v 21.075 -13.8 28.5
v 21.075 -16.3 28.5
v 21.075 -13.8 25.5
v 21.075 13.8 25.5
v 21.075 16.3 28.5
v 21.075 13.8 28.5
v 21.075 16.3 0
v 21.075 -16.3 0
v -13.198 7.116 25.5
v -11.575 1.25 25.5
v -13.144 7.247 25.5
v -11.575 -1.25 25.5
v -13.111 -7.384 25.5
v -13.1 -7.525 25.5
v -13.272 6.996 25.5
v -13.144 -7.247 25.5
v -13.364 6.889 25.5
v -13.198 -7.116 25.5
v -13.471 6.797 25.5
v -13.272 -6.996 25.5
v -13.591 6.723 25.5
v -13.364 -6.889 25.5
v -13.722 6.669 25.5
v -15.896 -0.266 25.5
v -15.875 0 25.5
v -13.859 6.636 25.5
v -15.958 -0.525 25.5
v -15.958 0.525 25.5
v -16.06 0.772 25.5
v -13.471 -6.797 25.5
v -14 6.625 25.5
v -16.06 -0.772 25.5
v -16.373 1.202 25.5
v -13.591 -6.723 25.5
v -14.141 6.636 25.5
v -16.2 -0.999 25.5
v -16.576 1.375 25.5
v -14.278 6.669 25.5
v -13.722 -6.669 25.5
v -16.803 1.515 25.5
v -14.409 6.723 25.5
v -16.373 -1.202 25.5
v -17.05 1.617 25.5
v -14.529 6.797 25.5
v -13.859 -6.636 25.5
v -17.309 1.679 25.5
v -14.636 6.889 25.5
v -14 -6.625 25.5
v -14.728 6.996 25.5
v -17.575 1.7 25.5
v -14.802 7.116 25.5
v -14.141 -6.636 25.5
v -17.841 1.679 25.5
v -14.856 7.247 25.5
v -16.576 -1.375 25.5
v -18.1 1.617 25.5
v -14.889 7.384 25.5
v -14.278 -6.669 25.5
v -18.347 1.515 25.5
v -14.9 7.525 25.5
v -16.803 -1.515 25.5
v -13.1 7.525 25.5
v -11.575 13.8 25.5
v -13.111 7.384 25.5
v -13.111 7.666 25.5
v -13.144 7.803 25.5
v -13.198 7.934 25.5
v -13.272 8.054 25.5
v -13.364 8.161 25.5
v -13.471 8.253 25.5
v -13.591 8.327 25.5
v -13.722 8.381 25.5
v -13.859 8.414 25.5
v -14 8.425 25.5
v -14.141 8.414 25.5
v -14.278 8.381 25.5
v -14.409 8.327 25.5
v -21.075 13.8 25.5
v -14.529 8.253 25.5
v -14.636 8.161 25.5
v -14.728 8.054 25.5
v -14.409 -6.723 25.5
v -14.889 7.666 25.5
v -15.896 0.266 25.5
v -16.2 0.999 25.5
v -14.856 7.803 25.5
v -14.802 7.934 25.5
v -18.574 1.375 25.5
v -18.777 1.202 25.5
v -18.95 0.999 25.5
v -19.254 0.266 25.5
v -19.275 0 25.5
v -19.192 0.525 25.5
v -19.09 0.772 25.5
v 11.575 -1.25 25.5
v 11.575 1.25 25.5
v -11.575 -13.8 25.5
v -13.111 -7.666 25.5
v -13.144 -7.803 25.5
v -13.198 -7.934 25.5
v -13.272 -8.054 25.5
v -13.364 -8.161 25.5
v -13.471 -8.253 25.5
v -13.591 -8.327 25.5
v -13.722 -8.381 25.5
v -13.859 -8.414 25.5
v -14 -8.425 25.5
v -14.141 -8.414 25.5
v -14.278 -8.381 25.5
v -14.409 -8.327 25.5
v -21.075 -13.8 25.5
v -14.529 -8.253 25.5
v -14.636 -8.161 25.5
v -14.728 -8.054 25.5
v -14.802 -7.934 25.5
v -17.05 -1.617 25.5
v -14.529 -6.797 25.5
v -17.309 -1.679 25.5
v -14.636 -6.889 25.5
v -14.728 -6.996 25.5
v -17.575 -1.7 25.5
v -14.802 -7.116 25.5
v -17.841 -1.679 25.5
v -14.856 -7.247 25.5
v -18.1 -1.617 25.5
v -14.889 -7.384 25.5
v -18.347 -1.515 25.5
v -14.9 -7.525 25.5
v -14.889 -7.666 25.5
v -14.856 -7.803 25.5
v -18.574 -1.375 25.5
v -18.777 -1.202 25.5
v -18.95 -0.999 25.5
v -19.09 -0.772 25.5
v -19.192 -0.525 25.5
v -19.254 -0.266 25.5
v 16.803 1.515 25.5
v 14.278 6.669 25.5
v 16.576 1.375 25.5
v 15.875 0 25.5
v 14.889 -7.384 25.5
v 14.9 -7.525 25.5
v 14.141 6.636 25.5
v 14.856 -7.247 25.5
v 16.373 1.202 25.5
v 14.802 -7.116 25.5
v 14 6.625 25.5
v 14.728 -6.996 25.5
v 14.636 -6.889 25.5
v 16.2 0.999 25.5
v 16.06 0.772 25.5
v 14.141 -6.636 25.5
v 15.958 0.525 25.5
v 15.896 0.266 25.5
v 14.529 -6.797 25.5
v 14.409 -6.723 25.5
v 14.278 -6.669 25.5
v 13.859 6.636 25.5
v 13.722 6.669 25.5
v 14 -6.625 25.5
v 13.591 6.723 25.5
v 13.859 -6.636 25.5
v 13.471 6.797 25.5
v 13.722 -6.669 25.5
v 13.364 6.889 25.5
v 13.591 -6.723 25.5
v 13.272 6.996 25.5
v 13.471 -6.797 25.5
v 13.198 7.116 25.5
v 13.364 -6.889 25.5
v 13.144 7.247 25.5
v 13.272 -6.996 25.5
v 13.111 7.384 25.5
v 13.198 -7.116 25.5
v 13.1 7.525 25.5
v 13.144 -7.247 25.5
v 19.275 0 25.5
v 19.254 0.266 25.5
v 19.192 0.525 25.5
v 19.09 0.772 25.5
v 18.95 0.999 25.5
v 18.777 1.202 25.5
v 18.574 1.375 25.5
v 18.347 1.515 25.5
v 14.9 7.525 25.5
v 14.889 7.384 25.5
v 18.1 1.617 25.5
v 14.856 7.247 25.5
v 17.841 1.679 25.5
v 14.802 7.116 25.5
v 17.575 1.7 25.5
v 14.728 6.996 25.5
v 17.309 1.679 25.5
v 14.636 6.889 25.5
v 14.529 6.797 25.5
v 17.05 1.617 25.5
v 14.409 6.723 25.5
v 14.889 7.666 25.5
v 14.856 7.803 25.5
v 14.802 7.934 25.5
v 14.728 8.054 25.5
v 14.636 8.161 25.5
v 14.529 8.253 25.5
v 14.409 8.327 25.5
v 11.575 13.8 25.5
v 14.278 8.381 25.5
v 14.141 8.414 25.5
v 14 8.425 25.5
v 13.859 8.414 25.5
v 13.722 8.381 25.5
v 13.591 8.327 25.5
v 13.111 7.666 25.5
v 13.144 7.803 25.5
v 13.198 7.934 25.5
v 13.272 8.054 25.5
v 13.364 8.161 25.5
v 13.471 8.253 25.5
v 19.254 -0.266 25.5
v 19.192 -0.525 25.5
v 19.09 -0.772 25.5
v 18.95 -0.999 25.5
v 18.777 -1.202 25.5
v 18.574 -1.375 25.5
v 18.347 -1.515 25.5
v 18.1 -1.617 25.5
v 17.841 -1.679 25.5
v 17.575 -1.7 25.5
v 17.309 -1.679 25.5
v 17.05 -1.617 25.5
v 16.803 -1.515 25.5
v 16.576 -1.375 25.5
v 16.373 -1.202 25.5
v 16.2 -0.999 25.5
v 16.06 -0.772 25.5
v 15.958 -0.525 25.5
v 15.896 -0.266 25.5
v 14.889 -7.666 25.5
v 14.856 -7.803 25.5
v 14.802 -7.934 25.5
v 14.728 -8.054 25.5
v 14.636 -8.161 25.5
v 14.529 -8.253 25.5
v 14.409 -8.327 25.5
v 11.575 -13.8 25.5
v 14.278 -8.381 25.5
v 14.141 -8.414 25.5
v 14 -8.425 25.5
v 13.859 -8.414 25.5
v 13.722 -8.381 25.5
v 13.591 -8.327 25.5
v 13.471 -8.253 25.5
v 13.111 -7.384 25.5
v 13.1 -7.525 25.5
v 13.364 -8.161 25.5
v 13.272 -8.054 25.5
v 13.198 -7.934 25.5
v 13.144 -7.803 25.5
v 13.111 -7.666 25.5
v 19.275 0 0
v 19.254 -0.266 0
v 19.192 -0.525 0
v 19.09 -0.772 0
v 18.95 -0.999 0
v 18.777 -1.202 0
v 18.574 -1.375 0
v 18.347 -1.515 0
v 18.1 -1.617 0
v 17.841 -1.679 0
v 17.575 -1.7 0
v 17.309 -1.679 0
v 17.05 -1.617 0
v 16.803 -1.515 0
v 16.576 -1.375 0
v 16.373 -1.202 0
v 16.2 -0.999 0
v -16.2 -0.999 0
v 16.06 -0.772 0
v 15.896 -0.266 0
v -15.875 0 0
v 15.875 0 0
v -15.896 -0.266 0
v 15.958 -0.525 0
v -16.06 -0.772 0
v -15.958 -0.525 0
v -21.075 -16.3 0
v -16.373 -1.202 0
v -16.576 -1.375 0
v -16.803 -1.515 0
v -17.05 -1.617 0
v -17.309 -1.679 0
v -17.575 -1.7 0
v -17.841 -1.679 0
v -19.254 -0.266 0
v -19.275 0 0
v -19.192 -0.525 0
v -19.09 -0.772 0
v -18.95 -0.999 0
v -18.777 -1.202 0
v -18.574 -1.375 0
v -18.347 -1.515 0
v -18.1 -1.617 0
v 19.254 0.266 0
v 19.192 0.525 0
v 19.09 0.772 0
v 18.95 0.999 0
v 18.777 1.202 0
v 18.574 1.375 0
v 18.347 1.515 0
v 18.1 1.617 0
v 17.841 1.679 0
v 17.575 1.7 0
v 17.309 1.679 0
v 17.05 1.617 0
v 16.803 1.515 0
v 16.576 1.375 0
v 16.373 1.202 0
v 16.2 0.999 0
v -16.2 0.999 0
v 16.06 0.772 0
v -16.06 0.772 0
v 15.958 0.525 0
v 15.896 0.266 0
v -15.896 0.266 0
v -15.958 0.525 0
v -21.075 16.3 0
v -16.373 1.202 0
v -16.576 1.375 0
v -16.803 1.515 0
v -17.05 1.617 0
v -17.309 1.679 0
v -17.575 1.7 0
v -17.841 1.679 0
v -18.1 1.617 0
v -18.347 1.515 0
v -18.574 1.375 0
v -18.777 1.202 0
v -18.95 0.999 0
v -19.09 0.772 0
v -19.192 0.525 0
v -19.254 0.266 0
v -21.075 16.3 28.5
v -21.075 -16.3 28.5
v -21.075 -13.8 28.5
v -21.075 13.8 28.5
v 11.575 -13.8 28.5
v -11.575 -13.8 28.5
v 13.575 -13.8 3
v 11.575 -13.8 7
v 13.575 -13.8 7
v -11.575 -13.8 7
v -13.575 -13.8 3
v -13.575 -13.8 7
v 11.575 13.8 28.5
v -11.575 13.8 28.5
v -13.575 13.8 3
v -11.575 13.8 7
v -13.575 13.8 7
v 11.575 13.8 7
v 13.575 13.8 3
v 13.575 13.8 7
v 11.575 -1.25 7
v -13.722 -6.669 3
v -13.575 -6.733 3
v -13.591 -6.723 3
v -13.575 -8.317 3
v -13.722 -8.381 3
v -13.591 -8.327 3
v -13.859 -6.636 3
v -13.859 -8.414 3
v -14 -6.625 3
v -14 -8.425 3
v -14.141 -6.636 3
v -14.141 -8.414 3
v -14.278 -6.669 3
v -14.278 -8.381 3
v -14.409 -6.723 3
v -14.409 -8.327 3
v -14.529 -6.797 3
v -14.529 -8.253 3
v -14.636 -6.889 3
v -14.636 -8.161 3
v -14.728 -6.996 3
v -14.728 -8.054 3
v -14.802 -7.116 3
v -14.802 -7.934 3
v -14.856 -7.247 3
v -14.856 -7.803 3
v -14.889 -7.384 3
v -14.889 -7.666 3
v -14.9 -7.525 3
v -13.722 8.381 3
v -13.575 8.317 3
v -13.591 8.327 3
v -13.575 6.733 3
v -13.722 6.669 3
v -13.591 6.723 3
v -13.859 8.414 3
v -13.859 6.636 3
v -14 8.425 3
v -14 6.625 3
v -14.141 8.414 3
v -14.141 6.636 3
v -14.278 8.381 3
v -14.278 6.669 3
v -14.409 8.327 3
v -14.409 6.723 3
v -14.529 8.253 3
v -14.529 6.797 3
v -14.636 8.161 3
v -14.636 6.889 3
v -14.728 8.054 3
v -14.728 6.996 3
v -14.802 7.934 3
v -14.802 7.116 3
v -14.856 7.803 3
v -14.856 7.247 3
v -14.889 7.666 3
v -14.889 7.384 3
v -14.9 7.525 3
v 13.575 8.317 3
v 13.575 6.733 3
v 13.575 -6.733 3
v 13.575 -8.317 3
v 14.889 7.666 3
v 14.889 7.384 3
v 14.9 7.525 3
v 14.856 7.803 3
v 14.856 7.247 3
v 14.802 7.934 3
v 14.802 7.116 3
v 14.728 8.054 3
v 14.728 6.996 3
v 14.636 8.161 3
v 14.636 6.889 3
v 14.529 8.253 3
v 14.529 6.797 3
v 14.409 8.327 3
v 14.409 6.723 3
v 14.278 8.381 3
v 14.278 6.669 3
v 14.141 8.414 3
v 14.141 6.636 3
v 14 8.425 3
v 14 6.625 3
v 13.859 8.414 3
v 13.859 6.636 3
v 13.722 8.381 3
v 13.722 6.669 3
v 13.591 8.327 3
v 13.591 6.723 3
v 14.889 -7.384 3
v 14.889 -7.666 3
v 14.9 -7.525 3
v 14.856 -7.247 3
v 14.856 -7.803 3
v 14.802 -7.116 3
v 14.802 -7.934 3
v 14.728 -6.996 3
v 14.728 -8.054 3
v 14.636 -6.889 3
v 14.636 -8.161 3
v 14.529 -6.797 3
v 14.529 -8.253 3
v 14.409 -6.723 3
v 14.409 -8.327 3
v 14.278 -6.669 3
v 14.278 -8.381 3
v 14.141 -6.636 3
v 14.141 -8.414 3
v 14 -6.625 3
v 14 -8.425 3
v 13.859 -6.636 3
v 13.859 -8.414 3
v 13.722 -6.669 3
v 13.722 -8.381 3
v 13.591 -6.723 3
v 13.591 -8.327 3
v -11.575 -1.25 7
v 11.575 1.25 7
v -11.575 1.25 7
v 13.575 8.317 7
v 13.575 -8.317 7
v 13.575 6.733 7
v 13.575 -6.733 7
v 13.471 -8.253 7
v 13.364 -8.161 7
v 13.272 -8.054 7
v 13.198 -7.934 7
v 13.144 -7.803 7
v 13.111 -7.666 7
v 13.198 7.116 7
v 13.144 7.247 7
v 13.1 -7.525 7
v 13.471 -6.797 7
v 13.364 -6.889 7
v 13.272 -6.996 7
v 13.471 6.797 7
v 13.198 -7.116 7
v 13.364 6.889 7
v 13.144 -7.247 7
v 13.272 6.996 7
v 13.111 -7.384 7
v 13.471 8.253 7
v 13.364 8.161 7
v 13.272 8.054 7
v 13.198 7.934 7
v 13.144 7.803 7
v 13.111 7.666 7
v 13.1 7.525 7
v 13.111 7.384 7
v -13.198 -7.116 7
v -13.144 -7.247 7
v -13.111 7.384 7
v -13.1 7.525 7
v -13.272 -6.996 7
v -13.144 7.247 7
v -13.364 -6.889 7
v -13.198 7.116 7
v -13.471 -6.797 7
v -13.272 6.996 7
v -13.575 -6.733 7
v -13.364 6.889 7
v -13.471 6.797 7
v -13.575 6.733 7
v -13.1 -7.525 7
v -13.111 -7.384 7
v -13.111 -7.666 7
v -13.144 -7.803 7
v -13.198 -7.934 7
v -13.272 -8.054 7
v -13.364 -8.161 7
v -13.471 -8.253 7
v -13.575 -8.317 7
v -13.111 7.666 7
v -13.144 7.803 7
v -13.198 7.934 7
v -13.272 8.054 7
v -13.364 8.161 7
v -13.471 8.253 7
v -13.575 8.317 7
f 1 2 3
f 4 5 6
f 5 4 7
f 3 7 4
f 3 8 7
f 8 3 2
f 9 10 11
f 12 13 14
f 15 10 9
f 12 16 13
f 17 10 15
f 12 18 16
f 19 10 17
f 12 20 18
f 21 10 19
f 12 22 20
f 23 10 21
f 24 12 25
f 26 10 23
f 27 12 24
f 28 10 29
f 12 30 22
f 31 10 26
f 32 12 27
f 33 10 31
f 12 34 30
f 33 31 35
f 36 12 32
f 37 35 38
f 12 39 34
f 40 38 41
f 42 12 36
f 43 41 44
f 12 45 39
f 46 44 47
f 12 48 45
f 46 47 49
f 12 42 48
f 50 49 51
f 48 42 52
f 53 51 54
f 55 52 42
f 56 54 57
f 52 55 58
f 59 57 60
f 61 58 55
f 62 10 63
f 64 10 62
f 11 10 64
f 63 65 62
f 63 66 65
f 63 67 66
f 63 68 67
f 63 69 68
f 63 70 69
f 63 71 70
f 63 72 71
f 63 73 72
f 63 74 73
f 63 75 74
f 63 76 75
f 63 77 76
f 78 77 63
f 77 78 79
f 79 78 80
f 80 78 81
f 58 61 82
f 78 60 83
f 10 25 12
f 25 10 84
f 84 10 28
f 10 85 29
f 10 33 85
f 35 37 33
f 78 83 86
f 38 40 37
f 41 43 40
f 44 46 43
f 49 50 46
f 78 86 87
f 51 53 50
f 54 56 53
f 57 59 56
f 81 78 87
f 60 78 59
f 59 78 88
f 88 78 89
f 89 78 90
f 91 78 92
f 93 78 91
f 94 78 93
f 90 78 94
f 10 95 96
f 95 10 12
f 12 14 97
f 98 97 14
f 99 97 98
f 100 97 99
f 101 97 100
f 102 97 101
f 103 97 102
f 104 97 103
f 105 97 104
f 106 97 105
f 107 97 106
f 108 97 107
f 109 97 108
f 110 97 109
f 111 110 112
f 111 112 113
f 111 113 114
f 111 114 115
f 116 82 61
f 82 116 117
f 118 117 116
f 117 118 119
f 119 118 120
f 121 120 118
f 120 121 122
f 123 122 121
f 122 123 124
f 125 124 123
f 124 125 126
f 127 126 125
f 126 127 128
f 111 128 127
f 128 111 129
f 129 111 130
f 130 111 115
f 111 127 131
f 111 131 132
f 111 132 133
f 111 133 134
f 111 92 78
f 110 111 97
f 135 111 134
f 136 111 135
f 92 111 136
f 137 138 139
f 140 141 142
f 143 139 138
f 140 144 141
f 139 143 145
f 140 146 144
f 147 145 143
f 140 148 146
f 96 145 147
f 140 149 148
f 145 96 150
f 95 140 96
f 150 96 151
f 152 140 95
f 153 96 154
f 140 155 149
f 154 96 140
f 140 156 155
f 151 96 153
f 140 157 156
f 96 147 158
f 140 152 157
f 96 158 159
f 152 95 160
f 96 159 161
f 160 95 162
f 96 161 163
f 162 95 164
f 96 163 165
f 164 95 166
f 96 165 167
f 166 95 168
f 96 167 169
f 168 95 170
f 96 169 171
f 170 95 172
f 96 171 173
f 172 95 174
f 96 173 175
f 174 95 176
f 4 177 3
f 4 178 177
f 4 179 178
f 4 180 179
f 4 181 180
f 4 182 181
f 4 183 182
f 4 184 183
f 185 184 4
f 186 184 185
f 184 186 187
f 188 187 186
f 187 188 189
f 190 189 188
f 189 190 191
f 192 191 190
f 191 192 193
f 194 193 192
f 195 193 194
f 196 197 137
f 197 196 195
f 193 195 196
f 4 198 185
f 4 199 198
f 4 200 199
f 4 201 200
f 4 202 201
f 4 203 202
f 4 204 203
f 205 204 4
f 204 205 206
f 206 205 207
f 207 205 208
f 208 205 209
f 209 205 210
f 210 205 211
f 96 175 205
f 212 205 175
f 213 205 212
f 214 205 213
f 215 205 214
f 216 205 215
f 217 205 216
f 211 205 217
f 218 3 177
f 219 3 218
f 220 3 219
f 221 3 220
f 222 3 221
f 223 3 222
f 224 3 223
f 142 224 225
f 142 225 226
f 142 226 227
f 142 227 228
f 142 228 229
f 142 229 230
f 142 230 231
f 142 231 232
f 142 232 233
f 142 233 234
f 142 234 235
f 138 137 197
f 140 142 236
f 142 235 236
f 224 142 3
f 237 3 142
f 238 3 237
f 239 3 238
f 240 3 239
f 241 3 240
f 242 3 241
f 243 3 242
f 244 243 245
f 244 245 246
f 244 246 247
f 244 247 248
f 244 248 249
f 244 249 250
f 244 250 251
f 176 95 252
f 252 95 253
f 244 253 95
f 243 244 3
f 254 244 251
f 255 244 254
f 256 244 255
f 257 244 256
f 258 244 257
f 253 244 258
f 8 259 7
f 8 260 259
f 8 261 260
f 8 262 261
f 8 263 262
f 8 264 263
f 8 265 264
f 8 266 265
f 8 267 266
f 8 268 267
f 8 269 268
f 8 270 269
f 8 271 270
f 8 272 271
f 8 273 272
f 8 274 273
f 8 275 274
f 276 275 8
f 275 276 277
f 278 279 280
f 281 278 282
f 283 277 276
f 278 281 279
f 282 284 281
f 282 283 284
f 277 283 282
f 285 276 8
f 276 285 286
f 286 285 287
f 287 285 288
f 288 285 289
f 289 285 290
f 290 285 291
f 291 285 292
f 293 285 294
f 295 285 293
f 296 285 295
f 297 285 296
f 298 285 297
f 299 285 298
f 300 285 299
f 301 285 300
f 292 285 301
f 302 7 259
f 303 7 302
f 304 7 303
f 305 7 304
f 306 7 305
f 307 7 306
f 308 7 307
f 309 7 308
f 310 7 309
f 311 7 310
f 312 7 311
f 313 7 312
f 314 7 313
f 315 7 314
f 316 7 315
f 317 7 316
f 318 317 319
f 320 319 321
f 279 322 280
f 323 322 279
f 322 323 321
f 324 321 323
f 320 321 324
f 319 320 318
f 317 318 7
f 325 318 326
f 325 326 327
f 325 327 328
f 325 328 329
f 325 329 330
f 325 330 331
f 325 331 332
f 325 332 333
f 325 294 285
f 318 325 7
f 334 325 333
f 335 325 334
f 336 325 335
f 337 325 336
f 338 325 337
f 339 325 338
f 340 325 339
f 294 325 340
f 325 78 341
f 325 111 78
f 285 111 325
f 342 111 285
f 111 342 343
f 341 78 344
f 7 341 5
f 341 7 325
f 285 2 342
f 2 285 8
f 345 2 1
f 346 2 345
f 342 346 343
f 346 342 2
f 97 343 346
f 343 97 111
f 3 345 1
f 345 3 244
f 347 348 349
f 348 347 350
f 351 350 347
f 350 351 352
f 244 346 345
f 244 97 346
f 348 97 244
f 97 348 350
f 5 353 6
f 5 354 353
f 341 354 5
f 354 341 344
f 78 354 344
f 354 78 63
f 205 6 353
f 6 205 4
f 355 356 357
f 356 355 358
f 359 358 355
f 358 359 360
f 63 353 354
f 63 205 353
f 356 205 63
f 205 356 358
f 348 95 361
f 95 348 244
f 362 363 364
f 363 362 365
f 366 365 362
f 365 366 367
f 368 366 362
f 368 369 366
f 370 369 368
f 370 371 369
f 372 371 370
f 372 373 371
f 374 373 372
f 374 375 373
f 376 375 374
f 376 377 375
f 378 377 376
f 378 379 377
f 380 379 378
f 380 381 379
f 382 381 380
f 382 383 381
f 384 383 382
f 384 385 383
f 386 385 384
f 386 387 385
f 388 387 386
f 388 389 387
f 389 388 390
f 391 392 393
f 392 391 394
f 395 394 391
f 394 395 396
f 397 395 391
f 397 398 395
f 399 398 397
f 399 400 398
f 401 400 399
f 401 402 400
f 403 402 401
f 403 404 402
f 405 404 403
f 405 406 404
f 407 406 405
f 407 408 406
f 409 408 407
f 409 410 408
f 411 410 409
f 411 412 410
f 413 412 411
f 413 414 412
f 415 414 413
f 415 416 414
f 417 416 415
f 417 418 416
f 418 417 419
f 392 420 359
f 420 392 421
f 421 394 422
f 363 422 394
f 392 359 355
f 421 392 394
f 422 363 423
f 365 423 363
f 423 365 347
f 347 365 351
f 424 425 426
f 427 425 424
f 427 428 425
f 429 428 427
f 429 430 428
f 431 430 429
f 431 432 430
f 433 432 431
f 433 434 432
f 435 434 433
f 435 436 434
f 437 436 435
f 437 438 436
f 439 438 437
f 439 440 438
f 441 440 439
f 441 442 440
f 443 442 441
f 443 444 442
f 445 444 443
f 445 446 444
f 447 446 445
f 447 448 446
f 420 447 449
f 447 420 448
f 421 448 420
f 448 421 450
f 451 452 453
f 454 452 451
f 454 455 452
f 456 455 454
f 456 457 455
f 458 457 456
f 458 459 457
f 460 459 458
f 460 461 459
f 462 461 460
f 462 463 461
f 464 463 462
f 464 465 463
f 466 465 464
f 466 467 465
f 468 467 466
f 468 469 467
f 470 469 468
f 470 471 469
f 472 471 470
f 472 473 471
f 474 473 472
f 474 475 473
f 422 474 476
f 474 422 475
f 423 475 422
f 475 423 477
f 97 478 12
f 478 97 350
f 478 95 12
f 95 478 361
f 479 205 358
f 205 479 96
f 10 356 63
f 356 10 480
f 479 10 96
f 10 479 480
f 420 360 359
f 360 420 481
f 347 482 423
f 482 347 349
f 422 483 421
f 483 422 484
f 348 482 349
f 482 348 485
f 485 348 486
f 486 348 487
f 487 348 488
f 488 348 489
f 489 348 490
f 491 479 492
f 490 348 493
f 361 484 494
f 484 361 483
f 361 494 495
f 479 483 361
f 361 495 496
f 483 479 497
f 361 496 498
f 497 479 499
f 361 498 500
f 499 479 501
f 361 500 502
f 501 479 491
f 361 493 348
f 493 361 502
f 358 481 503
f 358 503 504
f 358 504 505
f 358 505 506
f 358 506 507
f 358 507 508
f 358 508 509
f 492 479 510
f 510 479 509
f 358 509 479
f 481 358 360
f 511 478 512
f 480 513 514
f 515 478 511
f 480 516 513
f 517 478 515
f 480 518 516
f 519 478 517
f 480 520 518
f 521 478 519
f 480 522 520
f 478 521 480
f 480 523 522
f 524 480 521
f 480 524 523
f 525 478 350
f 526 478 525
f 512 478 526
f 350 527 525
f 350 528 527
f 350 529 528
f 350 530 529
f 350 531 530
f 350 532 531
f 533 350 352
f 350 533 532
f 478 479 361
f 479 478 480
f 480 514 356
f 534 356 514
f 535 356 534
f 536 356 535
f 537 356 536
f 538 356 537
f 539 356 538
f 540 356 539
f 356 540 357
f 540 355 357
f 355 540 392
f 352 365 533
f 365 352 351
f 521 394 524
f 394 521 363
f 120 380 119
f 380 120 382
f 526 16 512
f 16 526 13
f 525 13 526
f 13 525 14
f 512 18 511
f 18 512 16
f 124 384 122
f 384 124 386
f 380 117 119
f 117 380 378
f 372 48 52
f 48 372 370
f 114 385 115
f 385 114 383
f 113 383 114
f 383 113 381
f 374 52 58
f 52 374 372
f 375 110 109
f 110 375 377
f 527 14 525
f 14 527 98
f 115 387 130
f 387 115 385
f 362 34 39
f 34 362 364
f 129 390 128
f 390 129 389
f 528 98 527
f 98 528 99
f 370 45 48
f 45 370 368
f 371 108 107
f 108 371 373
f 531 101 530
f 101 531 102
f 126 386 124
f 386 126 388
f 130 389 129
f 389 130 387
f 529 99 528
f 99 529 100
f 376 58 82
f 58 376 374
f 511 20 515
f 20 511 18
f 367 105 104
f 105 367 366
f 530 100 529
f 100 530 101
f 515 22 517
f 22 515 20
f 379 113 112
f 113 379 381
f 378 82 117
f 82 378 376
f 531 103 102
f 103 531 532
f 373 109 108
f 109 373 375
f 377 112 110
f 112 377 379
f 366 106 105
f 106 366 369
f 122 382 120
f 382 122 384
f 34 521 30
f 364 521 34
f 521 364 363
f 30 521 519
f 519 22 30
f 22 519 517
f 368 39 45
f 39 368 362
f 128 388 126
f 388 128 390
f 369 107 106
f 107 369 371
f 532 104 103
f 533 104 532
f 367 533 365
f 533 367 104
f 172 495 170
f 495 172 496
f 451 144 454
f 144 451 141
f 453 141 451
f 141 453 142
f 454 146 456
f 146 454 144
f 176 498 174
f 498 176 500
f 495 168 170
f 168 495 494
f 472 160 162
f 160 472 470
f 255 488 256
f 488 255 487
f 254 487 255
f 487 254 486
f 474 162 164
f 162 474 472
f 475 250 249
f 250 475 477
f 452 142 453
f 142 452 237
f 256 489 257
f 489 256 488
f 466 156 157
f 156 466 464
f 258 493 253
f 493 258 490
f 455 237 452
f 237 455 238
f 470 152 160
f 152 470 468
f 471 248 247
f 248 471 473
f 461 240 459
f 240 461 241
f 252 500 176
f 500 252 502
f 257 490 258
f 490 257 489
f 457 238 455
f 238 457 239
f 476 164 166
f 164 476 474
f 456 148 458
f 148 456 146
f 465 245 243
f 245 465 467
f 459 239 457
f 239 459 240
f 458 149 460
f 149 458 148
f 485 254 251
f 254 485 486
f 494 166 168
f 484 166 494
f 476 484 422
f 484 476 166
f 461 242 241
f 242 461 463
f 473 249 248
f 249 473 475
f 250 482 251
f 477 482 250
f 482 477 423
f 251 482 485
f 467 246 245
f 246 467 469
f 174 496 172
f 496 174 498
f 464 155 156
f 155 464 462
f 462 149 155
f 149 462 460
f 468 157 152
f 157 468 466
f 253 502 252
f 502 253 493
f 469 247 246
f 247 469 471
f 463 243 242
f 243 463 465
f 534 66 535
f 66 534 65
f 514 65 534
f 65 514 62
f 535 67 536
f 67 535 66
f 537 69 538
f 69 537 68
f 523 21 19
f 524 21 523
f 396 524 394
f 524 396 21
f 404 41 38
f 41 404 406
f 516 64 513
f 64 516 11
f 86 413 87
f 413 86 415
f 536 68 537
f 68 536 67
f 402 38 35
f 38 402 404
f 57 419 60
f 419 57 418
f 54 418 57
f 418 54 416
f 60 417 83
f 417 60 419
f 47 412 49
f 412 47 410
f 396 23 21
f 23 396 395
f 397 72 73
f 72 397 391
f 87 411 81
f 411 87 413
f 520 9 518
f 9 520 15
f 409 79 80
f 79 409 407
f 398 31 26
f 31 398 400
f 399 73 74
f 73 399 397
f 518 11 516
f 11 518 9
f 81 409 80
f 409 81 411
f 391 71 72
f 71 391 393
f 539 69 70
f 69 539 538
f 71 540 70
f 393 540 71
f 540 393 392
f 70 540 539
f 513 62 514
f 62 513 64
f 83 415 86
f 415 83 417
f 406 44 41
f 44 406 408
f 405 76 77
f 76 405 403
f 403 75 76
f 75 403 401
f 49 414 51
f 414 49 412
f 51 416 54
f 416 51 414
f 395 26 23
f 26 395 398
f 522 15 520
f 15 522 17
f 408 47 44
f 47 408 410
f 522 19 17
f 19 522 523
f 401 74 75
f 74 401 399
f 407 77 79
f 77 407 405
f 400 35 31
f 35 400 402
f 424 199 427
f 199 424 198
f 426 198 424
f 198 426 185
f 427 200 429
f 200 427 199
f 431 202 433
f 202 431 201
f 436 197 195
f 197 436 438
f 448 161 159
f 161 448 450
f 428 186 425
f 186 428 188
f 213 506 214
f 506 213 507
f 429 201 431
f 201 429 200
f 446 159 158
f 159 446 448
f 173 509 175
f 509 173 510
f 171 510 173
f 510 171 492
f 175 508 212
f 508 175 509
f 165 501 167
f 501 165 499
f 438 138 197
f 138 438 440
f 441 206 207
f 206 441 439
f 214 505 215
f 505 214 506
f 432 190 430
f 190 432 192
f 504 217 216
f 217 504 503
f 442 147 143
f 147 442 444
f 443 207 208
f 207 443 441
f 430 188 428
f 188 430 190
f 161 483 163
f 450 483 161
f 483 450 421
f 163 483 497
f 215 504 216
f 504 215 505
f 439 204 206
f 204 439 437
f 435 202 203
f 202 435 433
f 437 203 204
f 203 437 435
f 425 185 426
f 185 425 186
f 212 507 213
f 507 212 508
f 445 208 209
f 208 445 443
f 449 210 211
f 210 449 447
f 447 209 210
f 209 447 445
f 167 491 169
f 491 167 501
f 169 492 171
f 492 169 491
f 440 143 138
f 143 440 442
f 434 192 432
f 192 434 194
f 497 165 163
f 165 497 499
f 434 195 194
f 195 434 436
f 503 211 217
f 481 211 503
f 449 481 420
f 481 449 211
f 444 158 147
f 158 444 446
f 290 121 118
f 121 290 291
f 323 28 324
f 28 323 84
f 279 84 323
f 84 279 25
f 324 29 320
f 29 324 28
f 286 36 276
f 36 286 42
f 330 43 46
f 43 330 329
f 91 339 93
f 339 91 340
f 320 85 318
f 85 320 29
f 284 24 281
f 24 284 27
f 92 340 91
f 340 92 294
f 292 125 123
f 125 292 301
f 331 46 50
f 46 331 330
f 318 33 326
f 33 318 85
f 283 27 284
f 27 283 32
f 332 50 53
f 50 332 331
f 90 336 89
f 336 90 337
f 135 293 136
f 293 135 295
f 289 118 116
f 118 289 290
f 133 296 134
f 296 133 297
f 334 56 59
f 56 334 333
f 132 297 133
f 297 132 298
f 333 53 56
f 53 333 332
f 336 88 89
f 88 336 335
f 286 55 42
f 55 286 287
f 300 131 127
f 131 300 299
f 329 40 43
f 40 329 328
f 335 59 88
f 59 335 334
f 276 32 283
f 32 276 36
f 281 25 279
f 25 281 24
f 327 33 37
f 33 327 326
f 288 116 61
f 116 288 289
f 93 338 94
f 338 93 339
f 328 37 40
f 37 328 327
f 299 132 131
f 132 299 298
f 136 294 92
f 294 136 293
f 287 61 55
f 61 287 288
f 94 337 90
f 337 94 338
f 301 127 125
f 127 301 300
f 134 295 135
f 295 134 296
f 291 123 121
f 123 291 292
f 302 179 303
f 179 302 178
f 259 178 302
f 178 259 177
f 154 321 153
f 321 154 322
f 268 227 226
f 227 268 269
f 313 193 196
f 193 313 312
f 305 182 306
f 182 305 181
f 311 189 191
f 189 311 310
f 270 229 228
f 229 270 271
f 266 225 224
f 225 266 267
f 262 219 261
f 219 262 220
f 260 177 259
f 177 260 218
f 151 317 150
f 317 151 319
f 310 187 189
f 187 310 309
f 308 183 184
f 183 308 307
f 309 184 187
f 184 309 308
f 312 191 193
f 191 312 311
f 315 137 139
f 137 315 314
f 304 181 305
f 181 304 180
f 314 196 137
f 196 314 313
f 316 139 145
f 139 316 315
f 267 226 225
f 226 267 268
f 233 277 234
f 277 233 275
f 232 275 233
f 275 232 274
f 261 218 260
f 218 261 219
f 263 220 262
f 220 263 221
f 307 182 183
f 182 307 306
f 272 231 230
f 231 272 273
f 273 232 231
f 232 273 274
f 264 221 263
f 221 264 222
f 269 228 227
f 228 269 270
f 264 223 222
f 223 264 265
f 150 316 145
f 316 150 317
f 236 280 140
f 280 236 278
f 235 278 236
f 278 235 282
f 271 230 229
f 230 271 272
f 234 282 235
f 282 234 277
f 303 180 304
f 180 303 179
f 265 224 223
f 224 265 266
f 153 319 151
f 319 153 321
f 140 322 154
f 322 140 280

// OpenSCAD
// file: params.scad
// params.scad — Parametros globales para el montaje de actuadores MASK-7
// Compatible con OpenSCAD 2021+

$fn = 40; // Calidad de curvas circulares

// --- Tolerancia general para impresion FDM ---
tol = 0.35; // Holgura lateral para ajuste deslizante firme

// --- Micro-servo standard tipo MG90S / SG90 ---
servo_length = 22.8 + tol;       // Largo del cuerpo principal (mm)
servo_width  = 12.2 + tol;       // Ancho del cuerpo principal (mm)
servo_height = 22.5;             // Altura del cuerpo hasta las orejas de montaje (mm)
servo_total_height = 28.5;       // Altura total incluyendo cabezal del eje (mm)

servo_flange_length = 32.5;      // Largo total con orejas de fijacion (mm)
servo_flange_thickness = 2.5;    // Espesor de las orejas del servo (mm)
servo_hole_dist = 28.0;          // Distancia entre centros de tornillos de fijacion (mm)

// --- Tornilleria ---
screw_m2_dia = 2.0;              // Diametro nominal tornillo M2 (mm)
screw_m2_hole = 2.4;             // Agujero de paso M2 con holgura (mm)
screw_m2_tap  = 1.8;             // Agujero para autorroscar M2 en plastico (mm)

screw_m3_dia = 3.0;              // Diametro nominal tornillo M3 (mm)
screw_m3_hole = 3.4;             // Agujero de paso M3 con holgura (mm)
screw_m3_tap  = 2.8;             // Agujero autorroscante M3 (mm)

// --- Espesores estructurales de soportes ---
wall_thickness = 2.5;            // Espesor de pared minima para rigidez (mm)
base_thickness = 3.0;            // Espesor de la placa base atornillable (mm)

// --- Solenoide mini 5V (tipo JF-0530B) ---
solenoid_length = 30.0 + tol;    // Largo del cuerpo del solenoide (mm)
solenoid_width  = 13.0 + tol;    // Ancho del cuerpo del solenoide (mm)
solenoid_height = 15.0 + tol;    // Altura del cuerpo del solenoide (mm)
solenoid_hole_dist = 16.0;       // Distancia entre agujeros roscados M3 de fijacion (mm)

// --- Campana resonadora ---
bell_diameter = 40.0;            // Diametro de campana o cuenco (mm)
bell_height   = 20.0;            // Altura de campana (mm)
// main file
// eye_mount.scad — Soporte para servos de ojos (Pan / Tilt) de la mascara Hannya
//
// =============================================================================
// MEDIDAS A VERIFICAR EN LA MASCARA REAL ANTES DE IMPRIMIR:
// 1. Distancia interpupilar (IPD) entre los centros de las cuencas oculares de la mascara.
// 2. Profundidad disponible desde el plano de los parpados hasta la frente del usuario.
// 3. Radio maximo de los globos oculares acoplados para evitar colision en pan/tilt extremo.
// 4. Inclinacion del puente nasal interior donde apoya el soporte central.
// =============================================================================

include <params.scad>

module eye_mount() {
    pocket_l = servo_length;
    pocket_w = servo_width;
    pocket_h = servo_height;

    // Espacio para 2 servos (pan X y tilt Y) dispuestos en soporte integrado
    block_w = (pocket_w * 2) + (wall_thickness * 3);
    block_l = pocket_l + (wall_thickness * 2);
    block_h = pocket_h + base_thickness;

    flange_ext = 14.0;
    total_l = block_l + flange_ext;

    difference() {
        union() {
            // Cuerpo principal del bloque
            translate([-total_l / 2, -block_w / 2, 0])
                cube([total_l, block_w, block_h]);

            // Refuerzos laterales
            translate([-total_l / 2, -block_w / 2, 0])
                cube([total_l, wall_thickness, block_h + 3.0]);
            translate([-total_l / 2, block_w / 2 - wall_thickness, 0])
                cube([total_l, wall_thickness, block_h + 3.0]);
        }

        // Cavidad para Servo 1 (Eye X - Pan)
        translate([-pocket_l / 2, -pocket_w - (wall_thickness / 2), base_thickness])
            cube([pocket_l, pocket_w, pocket_h + 5]);

        // Cavidad para Servo 2 (Eye Y - Tilt)
        translate([-pocket_l / 2, (wall_thickness / 2), base_thickness])
            cube([pocket_l, pocket_w, pocket_h + 5]);

        // Ranura para cables en la base
        translate([-pocket_l / 2 - 2, -block_w / 2 + wall_thickness, base_thickness])
            cube([pocket_l + 4, block_w - (wall_thickness * 2), 4.0]);

        // Agujeros para orejas de servos (M2)
        // Servo 1
        translate([-servo_hole_dist / 2, -pocket_w / 2 - (wall_thickness / 2), base_thickness])
            cylinder(d = screw_m2_tap, h = block_h);
        translate([servo_hole_dist / 2, -pocket_w / 2 - (wall_thickness / 2), base_thickness])
            cylinder(d = screw_m2_tap, h = block_h);

        // Servo 2
        translate([-servo_hole_dist / 2, pocket_w / 2 + (wall_thickness / 2), base_thickness])
            cylinder(d = screw_m2_tap, h = block_h);
        translate([servo_hole_dist / 2, pocket_w / 2 + (wall_thickness / 2), base_thickness])
            cylinder(d = screw_m2_tap, h = block_h);

        // Agujeros de anclaje a la mascara (M3 conicas/pasantes en extremos)
        translate([-total_l / 2 + 3.5, 0, -1])
            cylinder(d = screw_m3_hole, h = block_h + 2);
        translate([total_l / 2 - 3.5, 0, -1])
            cylinder(d = screw_m3_hole, h = block_h + 2);
    }
}

// Renderizado directo
eye_mount();
